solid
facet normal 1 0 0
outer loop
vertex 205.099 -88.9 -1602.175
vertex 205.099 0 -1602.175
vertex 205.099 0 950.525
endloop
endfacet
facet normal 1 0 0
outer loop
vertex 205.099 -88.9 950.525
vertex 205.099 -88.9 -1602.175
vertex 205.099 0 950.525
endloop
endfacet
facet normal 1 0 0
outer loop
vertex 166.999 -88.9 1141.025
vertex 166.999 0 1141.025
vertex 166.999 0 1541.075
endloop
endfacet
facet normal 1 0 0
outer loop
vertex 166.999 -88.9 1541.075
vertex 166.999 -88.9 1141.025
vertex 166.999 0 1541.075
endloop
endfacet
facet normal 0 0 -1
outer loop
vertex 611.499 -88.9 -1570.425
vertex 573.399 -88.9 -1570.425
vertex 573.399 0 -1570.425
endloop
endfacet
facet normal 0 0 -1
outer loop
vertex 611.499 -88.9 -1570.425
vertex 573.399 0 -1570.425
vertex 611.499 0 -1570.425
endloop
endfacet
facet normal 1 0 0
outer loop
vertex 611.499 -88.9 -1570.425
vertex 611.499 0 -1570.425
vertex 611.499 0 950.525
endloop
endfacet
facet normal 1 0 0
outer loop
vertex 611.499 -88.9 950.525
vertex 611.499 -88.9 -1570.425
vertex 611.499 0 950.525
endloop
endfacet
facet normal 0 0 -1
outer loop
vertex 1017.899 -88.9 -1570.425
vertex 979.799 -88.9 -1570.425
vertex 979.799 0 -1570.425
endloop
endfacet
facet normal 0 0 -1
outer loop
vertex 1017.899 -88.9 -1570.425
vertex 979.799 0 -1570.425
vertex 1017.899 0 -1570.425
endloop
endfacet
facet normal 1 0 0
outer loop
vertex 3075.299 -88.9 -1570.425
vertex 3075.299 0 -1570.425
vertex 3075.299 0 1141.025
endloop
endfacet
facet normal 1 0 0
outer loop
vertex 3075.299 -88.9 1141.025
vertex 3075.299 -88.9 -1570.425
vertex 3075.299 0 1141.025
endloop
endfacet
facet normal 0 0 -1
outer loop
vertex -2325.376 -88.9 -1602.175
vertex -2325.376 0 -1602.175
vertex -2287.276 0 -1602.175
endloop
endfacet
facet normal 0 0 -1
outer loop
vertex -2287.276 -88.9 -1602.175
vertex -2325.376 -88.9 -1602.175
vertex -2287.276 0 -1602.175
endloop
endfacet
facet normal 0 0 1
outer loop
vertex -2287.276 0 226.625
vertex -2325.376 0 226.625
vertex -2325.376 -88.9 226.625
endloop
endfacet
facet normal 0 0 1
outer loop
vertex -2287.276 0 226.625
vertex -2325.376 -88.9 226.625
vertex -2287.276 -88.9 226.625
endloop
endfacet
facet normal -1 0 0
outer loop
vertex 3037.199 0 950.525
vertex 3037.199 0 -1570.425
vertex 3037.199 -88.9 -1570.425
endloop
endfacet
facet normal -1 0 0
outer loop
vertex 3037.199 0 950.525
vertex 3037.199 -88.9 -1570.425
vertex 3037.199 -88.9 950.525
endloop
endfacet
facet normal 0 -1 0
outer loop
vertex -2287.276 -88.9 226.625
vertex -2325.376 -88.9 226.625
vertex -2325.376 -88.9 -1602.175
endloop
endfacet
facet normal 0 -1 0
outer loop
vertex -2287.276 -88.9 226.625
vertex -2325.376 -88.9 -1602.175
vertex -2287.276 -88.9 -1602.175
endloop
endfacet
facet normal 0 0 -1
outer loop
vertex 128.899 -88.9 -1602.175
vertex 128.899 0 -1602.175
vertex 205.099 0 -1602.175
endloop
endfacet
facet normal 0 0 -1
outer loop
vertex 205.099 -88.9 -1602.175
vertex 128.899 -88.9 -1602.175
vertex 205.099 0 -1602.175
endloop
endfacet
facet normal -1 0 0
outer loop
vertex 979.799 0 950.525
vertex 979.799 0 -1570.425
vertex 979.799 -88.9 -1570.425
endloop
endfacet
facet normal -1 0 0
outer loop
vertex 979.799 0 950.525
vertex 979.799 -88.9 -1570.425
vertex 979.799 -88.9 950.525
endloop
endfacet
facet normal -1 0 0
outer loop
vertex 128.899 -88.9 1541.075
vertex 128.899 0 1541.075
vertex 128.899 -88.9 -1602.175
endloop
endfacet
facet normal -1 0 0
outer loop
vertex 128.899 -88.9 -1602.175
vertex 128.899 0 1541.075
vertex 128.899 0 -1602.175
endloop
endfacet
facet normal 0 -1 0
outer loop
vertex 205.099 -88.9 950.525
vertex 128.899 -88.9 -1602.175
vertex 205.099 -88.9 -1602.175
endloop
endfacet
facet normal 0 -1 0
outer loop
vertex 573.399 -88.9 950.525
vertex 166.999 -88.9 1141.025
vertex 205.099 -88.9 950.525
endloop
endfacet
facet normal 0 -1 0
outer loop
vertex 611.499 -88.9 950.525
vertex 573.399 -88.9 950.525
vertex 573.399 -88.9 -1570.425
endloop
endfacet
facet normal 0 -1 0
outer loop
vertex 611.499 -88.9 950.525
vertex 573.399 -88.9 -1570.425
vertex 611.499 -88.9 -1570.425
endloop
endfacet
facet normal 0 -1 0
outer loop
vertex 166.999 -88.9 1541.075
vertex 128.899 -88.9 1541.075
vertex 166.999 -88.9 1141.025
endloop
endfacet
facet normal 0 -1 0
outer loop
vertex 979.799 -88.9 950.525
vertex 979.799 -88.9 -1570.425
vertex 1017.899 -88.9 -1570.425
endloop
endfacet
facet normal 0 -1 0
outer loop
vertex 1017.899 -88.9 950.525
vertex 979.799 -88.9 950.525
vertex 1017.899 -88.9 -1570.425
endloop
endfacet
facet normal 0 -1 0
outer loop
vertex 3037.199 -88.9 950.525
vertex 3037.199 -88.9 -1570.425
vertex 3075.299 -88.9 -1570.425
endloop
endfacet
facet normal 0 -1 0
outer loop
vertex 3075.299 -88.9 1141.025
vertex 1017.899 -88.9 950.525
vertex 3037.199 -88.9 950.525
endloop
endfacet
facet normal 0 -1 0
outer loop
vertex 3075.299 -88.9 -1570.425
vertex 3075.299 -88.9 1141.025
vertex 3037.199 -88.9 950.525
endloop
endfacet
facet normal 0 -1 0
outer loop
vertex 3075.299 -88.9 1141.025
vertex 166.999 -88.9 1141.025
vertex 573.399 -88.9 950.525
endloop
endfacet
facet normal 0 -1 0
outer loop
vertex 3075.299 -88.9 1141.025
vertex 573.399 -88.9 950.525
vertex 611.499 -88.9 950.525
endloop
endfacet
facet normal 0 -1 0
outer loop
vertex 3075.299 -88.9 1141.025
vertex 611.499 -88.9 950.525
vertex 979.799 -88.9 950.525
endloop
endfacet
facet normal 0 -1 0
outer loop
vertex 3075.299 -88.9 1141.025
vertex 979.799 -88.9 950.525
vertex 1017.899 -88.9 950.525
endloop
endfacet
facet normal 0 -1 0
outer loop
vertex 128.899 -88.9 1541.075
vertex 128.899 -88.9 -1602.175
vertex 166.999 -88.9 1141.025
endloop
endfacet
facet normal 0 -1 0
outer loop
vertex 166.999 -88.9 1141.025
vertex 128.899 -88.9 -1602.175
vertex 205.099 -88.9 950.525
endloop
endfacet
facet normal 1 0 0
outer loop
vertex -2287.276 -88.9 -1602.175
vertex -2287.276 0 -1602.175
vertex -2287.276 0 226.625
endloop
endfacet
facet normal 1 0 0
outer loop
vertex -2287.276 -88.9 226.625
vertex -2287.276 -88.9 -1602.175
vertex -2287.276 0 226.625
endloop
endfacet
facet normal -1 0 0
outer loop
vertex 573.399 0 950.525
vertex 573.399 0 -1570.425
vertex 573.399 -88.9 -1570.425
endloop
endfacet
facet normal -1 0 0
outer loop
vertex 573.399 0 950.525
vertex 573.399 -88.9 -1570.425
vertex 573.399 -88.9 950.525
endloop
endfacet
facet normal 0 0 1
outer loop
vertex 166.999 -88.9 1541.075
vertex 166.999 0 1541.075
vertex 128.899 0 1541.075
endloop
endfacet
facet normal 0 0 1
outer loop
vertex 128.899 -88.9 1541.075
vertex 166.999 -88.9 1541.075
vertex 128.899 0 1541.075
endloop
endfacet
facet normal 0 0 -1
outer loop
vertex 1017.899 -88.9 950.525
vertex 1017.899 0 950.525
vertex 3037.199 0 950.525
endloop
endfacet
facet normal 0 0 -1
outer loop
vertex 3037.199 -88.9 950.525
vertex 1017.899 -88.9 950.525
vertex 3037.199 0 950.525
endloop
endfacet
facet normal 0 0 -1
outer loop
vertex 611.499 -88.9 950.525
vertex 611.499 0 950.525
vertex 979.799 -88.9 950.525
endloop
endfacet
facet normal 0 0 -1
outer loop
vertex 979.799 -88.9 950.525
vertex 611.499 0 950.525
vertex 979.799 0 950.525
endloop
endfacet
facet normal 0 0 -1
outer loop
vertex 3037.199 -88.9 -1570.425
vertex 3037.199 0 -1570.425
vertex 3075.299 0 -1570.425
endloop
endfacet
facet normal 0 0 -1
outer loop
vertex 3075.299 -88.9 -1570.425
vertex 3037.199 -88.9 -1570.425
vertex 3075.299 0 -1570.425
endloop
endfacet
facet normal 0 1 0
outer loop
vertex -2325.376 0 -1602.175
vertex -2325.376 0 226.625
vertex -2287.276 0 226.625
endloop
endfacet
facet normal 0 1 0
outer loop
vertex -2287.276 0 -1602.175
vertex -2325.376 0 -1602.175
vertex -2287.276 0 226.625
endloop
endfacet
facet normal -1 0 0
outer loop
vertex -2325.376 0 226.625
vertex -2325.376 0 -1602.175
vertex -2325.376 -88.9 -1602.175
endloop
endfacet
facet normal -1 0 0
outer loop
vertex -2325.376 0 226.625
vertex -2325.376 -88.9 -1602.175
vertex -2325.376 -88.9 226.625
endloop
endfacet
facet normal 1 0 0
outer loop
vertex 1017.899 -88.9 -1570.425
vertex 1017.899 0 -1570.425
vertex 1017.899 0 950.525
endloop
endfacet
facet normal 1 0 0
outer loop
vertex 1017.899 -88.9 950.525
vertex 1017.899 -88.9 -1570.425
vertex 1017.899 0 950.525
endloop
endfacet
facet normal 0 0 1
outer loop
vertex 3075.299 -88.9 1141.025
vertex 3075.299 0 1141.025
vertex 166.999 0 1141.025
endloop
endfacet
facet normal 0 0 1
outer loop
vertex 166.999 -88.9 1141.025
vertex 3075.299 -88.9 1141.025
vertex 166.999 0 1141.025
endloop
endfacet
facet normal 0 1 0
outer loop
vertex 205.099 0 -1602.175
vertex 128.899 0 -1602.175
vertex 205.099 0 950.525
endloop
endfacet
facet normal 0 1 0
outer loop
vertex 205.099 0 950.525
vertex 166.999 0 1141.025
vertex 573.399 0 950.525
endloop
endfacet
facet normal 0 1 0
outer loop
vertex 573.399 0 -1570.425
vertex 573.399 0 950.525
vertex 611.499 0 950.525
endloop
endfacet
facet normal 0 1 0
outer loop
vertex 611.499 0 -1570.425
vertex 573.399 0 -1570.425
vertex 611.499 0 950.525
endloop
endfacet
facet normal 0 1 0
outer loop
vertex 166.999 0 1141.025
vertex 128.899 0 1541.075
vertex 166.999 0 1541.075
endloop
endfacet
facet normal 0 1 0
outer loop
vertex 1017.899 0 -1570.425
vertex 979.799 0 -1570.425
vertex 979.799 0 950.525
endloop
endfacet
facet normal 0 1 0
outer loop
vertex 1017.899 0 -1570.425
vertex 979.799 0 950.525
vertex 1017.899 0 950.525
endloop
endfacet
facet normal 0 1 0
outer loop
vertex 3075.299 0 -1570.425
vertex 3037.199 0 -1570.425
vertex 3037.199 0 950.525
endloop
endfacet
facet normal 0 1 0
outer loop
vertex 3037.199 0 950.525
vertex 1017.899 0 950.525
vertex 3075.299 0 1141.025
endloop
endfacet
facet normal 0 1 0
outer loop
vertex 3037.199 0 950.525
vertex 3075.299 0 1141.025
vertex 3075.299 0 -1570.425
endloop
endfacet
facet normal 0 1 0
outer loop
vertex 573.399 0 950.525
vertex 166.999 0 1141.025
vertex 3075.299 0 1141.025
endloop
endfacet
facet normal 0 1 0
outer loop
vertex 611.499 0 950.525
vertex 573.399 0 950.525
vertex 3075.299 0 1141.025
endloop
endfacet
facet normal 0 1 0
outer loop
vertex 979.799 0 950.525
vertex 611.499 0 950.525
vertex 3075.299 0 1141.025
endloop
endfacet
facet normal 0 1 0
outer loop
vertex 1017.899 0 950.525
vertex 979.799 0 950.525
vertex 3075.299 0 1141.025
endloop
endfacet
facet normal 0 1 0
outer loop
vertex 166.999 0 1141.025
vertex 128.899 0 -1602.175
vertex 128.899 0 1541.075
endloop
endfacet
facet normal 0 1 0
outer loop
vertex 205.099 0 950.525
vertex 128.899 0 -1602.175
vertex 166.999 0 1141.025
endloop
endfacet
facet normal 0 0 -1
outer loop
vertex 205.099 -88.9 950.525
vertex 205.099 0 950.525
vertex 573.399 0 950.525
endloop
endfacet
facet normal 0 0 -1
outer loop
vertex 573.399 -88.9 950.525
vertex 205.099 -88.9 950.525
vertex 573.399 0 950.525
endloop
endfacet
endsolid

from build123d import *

# Parameters (mm, degrees)
F0_W     = 38.1
F0_H     = 1828.8
F0_H_2   = 2520.95
F0_H_3   = 2552.7
F1_DEPTH = 88.9


with BuildPart() as f1:
    # F0 (on Front) → F1 (new body)
    with BuildSketch(Plane.XZ):
        with Locations((-2306.326113, -687.774918)):
            Rectangle(F0_W, F0_H)
        with Locations((3056.248887, -309.949918)):
            Rectangle(F0_W, F0_H_2)
        with Locations((998.848887, -309.949918)):
            Rectangle(F0_W, F0_H_2)
        with Locations((592.448887, -309.949918)):
            Rectangle(F0_W, F0_H_2)
        with Locations((186.048887, -325.824918)):
            Rectangle(F0_W, F0_H_3)
        Polygon((166.998887, 950.525082), (166.998887, 1141.025082), (166.998887, 1541.075082), (128.898887, 1541.075082), (128.898887, -1602.174918), (166.998887, -1602.174918), align=None)
        Polygon((3037.198887, 950.525082), (3075.298887, 950.525082), (3075.298887, 1141.025082), (166.998887, 1141.025082), (166.998887, 950.525082), (205.098887, 950.525082), (573.398887, 950.525082), (611.498887, 950.525082), (979.798887, 950.525082), (1017.898887, 950.525082), align=None)
    extrude(amount=F1_DEPTH)


solid = f1.part
